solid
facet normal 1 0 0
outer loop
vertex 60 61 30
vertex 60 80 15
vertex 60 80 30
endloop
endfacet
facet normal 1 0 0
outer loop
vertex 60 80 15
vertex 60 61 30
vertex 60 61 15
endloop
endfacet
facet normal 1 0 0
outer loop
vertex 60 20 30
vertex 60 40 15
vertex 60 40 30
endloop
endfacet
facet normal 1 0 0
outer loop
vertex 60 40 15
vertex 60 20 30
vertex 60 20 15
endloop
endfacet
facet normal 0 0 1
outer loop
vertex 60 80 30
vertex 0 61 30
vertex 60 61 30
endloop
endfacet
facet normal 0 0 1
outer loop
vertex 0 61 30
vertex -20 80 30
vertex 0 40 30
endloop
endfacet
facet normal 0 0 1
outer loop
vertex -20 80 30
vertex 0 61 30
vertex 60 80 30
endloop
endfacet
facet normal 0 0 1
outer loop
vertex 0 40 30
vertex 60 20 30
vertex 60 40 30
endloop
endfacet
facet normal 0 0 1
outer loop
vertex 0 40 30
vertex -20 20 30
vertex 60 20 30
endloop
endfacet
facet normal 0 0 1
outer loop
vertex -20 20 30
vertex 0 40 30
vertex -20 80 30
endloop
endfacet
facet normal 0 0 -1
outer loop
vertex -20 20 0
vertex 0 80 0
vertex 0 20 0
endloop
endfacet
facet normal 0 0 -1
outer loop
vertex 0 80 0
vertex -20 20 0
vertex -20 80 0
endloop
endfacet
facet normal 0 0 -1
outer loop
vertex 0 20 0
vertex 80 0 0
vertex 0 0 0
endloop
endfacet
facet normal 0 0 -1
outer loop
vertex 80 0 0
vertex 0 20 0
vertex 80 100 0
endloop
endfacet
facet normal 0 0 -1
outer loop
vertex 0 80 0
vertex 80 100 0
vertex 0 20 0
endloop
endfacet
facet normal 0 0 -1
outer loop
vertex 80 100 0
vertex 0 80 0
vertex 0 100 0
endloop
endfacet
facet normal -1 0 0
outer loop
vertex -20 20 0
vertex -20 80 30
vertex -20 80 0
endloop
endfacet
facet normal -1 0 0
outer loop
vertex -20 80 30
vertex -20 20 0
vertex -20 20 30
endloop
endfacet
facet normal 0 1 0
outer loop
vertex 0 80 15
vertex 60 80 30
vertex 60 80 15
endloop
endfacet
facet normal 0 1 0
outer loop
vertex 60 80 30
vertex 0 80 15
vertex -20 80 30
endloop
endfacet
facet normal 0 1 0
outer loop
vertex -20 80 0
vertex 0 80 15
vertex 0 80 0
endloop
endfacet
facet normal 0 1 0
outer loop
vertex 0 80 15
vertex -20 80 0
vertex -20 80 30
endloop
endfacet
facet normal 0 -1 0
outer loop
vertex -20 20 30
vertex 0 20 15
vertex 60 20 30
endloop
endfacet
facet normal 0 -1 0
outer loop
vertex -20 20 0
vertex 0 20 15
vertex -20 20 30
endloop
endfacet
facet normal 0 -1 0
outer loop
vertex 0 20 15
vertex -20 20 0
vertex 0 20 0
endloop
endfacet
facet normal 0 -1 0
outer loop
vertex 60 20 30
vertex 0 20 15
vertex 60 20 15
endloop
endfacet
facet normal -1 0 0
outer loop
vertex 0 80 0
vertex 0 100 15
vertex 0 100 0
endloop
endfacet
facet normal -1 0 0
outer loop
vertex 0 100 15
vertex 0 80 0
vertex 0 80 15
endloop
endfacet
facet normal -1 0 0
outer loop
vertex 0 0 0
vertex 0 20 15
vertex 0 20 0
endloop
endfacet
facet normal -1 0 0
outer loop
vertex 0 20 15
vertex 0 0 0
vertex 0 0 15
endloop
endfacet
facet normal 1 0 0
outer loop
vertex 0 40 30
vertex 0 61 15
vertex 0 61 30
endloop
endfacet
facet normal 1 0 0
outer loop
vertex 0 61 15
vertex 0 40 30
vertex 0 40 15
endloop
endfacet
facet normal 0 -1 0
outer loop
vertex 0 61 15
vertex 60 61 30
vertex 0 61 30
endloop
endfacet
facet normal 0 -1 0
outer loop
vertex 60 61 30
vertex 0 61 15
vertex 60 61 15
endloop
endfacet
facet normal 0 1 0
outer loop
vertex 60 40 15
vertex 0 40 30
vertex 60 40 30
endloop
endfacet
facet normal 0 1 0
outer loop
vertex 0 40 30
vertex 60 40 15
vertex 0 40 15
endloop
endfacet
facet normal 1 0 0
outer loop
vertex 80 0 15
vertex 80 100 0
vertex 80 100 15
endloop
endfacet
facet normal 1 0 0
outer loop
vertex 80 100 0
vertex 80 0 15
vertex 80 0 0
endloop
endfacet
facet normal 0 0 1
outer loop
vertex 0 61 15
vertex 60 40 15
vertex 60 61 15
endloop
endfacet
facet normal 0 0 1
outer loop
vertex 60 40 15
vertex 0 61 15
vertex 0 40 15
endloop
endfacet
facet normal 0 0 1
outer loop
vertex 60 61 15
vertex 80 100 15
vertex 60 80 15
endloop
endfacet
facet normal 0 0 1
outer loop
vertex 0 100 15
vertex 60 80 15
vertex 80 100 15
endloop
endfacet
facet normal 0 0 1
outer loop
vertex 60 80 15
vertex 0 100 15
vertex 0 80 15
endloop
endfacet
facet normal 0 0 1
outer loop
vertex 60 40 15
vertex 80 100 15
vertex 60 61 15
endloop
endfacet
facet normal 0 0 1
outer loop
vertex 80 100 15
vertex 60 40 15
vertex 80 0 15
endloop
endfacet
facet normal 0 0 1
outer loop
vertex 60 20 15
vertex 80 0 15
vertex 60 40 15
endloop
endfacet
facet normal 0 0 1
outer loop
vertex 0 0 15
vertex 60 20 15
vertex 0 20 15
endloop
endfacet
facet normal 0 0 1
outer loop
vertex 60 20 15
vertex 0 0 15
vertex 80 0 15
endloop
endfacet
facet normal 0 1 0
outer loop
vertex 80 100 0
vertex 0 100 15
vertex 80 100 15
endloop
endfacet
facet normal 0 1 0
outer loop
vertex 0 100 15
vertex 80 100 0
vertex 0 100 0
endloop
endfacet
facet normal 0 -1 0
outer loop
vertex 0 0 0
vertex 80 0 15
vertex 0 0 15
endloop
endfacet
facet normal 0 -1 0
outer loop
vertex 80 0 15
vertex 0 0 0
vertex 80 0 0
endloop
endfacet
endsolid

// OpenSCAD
// Logo du Club Micro
// Lettre C dans le M
// 2016 - FRA
// Et un jour peut-etre notre Super Micro ... :D

echo(version=version());

y=100; // Largeur lettre M

ll=y/5; // Largeur de trait des lettres
x=y-ll;  // Longueur lettre M
z=15;  // Epaisseur lettre M

union() {
  // Le M bleu
  color("blue")
  cube([x, y, z]);

  // Le C orange
  difference() {
    color("orange")
    translate([-ll, ll, 0])
    cube([x, y-2*ll , z*2]);
    
    translate([0, 2*ll, 0])
    cube([x-ll+1, ll+1, z*2+1]);
  }
}
